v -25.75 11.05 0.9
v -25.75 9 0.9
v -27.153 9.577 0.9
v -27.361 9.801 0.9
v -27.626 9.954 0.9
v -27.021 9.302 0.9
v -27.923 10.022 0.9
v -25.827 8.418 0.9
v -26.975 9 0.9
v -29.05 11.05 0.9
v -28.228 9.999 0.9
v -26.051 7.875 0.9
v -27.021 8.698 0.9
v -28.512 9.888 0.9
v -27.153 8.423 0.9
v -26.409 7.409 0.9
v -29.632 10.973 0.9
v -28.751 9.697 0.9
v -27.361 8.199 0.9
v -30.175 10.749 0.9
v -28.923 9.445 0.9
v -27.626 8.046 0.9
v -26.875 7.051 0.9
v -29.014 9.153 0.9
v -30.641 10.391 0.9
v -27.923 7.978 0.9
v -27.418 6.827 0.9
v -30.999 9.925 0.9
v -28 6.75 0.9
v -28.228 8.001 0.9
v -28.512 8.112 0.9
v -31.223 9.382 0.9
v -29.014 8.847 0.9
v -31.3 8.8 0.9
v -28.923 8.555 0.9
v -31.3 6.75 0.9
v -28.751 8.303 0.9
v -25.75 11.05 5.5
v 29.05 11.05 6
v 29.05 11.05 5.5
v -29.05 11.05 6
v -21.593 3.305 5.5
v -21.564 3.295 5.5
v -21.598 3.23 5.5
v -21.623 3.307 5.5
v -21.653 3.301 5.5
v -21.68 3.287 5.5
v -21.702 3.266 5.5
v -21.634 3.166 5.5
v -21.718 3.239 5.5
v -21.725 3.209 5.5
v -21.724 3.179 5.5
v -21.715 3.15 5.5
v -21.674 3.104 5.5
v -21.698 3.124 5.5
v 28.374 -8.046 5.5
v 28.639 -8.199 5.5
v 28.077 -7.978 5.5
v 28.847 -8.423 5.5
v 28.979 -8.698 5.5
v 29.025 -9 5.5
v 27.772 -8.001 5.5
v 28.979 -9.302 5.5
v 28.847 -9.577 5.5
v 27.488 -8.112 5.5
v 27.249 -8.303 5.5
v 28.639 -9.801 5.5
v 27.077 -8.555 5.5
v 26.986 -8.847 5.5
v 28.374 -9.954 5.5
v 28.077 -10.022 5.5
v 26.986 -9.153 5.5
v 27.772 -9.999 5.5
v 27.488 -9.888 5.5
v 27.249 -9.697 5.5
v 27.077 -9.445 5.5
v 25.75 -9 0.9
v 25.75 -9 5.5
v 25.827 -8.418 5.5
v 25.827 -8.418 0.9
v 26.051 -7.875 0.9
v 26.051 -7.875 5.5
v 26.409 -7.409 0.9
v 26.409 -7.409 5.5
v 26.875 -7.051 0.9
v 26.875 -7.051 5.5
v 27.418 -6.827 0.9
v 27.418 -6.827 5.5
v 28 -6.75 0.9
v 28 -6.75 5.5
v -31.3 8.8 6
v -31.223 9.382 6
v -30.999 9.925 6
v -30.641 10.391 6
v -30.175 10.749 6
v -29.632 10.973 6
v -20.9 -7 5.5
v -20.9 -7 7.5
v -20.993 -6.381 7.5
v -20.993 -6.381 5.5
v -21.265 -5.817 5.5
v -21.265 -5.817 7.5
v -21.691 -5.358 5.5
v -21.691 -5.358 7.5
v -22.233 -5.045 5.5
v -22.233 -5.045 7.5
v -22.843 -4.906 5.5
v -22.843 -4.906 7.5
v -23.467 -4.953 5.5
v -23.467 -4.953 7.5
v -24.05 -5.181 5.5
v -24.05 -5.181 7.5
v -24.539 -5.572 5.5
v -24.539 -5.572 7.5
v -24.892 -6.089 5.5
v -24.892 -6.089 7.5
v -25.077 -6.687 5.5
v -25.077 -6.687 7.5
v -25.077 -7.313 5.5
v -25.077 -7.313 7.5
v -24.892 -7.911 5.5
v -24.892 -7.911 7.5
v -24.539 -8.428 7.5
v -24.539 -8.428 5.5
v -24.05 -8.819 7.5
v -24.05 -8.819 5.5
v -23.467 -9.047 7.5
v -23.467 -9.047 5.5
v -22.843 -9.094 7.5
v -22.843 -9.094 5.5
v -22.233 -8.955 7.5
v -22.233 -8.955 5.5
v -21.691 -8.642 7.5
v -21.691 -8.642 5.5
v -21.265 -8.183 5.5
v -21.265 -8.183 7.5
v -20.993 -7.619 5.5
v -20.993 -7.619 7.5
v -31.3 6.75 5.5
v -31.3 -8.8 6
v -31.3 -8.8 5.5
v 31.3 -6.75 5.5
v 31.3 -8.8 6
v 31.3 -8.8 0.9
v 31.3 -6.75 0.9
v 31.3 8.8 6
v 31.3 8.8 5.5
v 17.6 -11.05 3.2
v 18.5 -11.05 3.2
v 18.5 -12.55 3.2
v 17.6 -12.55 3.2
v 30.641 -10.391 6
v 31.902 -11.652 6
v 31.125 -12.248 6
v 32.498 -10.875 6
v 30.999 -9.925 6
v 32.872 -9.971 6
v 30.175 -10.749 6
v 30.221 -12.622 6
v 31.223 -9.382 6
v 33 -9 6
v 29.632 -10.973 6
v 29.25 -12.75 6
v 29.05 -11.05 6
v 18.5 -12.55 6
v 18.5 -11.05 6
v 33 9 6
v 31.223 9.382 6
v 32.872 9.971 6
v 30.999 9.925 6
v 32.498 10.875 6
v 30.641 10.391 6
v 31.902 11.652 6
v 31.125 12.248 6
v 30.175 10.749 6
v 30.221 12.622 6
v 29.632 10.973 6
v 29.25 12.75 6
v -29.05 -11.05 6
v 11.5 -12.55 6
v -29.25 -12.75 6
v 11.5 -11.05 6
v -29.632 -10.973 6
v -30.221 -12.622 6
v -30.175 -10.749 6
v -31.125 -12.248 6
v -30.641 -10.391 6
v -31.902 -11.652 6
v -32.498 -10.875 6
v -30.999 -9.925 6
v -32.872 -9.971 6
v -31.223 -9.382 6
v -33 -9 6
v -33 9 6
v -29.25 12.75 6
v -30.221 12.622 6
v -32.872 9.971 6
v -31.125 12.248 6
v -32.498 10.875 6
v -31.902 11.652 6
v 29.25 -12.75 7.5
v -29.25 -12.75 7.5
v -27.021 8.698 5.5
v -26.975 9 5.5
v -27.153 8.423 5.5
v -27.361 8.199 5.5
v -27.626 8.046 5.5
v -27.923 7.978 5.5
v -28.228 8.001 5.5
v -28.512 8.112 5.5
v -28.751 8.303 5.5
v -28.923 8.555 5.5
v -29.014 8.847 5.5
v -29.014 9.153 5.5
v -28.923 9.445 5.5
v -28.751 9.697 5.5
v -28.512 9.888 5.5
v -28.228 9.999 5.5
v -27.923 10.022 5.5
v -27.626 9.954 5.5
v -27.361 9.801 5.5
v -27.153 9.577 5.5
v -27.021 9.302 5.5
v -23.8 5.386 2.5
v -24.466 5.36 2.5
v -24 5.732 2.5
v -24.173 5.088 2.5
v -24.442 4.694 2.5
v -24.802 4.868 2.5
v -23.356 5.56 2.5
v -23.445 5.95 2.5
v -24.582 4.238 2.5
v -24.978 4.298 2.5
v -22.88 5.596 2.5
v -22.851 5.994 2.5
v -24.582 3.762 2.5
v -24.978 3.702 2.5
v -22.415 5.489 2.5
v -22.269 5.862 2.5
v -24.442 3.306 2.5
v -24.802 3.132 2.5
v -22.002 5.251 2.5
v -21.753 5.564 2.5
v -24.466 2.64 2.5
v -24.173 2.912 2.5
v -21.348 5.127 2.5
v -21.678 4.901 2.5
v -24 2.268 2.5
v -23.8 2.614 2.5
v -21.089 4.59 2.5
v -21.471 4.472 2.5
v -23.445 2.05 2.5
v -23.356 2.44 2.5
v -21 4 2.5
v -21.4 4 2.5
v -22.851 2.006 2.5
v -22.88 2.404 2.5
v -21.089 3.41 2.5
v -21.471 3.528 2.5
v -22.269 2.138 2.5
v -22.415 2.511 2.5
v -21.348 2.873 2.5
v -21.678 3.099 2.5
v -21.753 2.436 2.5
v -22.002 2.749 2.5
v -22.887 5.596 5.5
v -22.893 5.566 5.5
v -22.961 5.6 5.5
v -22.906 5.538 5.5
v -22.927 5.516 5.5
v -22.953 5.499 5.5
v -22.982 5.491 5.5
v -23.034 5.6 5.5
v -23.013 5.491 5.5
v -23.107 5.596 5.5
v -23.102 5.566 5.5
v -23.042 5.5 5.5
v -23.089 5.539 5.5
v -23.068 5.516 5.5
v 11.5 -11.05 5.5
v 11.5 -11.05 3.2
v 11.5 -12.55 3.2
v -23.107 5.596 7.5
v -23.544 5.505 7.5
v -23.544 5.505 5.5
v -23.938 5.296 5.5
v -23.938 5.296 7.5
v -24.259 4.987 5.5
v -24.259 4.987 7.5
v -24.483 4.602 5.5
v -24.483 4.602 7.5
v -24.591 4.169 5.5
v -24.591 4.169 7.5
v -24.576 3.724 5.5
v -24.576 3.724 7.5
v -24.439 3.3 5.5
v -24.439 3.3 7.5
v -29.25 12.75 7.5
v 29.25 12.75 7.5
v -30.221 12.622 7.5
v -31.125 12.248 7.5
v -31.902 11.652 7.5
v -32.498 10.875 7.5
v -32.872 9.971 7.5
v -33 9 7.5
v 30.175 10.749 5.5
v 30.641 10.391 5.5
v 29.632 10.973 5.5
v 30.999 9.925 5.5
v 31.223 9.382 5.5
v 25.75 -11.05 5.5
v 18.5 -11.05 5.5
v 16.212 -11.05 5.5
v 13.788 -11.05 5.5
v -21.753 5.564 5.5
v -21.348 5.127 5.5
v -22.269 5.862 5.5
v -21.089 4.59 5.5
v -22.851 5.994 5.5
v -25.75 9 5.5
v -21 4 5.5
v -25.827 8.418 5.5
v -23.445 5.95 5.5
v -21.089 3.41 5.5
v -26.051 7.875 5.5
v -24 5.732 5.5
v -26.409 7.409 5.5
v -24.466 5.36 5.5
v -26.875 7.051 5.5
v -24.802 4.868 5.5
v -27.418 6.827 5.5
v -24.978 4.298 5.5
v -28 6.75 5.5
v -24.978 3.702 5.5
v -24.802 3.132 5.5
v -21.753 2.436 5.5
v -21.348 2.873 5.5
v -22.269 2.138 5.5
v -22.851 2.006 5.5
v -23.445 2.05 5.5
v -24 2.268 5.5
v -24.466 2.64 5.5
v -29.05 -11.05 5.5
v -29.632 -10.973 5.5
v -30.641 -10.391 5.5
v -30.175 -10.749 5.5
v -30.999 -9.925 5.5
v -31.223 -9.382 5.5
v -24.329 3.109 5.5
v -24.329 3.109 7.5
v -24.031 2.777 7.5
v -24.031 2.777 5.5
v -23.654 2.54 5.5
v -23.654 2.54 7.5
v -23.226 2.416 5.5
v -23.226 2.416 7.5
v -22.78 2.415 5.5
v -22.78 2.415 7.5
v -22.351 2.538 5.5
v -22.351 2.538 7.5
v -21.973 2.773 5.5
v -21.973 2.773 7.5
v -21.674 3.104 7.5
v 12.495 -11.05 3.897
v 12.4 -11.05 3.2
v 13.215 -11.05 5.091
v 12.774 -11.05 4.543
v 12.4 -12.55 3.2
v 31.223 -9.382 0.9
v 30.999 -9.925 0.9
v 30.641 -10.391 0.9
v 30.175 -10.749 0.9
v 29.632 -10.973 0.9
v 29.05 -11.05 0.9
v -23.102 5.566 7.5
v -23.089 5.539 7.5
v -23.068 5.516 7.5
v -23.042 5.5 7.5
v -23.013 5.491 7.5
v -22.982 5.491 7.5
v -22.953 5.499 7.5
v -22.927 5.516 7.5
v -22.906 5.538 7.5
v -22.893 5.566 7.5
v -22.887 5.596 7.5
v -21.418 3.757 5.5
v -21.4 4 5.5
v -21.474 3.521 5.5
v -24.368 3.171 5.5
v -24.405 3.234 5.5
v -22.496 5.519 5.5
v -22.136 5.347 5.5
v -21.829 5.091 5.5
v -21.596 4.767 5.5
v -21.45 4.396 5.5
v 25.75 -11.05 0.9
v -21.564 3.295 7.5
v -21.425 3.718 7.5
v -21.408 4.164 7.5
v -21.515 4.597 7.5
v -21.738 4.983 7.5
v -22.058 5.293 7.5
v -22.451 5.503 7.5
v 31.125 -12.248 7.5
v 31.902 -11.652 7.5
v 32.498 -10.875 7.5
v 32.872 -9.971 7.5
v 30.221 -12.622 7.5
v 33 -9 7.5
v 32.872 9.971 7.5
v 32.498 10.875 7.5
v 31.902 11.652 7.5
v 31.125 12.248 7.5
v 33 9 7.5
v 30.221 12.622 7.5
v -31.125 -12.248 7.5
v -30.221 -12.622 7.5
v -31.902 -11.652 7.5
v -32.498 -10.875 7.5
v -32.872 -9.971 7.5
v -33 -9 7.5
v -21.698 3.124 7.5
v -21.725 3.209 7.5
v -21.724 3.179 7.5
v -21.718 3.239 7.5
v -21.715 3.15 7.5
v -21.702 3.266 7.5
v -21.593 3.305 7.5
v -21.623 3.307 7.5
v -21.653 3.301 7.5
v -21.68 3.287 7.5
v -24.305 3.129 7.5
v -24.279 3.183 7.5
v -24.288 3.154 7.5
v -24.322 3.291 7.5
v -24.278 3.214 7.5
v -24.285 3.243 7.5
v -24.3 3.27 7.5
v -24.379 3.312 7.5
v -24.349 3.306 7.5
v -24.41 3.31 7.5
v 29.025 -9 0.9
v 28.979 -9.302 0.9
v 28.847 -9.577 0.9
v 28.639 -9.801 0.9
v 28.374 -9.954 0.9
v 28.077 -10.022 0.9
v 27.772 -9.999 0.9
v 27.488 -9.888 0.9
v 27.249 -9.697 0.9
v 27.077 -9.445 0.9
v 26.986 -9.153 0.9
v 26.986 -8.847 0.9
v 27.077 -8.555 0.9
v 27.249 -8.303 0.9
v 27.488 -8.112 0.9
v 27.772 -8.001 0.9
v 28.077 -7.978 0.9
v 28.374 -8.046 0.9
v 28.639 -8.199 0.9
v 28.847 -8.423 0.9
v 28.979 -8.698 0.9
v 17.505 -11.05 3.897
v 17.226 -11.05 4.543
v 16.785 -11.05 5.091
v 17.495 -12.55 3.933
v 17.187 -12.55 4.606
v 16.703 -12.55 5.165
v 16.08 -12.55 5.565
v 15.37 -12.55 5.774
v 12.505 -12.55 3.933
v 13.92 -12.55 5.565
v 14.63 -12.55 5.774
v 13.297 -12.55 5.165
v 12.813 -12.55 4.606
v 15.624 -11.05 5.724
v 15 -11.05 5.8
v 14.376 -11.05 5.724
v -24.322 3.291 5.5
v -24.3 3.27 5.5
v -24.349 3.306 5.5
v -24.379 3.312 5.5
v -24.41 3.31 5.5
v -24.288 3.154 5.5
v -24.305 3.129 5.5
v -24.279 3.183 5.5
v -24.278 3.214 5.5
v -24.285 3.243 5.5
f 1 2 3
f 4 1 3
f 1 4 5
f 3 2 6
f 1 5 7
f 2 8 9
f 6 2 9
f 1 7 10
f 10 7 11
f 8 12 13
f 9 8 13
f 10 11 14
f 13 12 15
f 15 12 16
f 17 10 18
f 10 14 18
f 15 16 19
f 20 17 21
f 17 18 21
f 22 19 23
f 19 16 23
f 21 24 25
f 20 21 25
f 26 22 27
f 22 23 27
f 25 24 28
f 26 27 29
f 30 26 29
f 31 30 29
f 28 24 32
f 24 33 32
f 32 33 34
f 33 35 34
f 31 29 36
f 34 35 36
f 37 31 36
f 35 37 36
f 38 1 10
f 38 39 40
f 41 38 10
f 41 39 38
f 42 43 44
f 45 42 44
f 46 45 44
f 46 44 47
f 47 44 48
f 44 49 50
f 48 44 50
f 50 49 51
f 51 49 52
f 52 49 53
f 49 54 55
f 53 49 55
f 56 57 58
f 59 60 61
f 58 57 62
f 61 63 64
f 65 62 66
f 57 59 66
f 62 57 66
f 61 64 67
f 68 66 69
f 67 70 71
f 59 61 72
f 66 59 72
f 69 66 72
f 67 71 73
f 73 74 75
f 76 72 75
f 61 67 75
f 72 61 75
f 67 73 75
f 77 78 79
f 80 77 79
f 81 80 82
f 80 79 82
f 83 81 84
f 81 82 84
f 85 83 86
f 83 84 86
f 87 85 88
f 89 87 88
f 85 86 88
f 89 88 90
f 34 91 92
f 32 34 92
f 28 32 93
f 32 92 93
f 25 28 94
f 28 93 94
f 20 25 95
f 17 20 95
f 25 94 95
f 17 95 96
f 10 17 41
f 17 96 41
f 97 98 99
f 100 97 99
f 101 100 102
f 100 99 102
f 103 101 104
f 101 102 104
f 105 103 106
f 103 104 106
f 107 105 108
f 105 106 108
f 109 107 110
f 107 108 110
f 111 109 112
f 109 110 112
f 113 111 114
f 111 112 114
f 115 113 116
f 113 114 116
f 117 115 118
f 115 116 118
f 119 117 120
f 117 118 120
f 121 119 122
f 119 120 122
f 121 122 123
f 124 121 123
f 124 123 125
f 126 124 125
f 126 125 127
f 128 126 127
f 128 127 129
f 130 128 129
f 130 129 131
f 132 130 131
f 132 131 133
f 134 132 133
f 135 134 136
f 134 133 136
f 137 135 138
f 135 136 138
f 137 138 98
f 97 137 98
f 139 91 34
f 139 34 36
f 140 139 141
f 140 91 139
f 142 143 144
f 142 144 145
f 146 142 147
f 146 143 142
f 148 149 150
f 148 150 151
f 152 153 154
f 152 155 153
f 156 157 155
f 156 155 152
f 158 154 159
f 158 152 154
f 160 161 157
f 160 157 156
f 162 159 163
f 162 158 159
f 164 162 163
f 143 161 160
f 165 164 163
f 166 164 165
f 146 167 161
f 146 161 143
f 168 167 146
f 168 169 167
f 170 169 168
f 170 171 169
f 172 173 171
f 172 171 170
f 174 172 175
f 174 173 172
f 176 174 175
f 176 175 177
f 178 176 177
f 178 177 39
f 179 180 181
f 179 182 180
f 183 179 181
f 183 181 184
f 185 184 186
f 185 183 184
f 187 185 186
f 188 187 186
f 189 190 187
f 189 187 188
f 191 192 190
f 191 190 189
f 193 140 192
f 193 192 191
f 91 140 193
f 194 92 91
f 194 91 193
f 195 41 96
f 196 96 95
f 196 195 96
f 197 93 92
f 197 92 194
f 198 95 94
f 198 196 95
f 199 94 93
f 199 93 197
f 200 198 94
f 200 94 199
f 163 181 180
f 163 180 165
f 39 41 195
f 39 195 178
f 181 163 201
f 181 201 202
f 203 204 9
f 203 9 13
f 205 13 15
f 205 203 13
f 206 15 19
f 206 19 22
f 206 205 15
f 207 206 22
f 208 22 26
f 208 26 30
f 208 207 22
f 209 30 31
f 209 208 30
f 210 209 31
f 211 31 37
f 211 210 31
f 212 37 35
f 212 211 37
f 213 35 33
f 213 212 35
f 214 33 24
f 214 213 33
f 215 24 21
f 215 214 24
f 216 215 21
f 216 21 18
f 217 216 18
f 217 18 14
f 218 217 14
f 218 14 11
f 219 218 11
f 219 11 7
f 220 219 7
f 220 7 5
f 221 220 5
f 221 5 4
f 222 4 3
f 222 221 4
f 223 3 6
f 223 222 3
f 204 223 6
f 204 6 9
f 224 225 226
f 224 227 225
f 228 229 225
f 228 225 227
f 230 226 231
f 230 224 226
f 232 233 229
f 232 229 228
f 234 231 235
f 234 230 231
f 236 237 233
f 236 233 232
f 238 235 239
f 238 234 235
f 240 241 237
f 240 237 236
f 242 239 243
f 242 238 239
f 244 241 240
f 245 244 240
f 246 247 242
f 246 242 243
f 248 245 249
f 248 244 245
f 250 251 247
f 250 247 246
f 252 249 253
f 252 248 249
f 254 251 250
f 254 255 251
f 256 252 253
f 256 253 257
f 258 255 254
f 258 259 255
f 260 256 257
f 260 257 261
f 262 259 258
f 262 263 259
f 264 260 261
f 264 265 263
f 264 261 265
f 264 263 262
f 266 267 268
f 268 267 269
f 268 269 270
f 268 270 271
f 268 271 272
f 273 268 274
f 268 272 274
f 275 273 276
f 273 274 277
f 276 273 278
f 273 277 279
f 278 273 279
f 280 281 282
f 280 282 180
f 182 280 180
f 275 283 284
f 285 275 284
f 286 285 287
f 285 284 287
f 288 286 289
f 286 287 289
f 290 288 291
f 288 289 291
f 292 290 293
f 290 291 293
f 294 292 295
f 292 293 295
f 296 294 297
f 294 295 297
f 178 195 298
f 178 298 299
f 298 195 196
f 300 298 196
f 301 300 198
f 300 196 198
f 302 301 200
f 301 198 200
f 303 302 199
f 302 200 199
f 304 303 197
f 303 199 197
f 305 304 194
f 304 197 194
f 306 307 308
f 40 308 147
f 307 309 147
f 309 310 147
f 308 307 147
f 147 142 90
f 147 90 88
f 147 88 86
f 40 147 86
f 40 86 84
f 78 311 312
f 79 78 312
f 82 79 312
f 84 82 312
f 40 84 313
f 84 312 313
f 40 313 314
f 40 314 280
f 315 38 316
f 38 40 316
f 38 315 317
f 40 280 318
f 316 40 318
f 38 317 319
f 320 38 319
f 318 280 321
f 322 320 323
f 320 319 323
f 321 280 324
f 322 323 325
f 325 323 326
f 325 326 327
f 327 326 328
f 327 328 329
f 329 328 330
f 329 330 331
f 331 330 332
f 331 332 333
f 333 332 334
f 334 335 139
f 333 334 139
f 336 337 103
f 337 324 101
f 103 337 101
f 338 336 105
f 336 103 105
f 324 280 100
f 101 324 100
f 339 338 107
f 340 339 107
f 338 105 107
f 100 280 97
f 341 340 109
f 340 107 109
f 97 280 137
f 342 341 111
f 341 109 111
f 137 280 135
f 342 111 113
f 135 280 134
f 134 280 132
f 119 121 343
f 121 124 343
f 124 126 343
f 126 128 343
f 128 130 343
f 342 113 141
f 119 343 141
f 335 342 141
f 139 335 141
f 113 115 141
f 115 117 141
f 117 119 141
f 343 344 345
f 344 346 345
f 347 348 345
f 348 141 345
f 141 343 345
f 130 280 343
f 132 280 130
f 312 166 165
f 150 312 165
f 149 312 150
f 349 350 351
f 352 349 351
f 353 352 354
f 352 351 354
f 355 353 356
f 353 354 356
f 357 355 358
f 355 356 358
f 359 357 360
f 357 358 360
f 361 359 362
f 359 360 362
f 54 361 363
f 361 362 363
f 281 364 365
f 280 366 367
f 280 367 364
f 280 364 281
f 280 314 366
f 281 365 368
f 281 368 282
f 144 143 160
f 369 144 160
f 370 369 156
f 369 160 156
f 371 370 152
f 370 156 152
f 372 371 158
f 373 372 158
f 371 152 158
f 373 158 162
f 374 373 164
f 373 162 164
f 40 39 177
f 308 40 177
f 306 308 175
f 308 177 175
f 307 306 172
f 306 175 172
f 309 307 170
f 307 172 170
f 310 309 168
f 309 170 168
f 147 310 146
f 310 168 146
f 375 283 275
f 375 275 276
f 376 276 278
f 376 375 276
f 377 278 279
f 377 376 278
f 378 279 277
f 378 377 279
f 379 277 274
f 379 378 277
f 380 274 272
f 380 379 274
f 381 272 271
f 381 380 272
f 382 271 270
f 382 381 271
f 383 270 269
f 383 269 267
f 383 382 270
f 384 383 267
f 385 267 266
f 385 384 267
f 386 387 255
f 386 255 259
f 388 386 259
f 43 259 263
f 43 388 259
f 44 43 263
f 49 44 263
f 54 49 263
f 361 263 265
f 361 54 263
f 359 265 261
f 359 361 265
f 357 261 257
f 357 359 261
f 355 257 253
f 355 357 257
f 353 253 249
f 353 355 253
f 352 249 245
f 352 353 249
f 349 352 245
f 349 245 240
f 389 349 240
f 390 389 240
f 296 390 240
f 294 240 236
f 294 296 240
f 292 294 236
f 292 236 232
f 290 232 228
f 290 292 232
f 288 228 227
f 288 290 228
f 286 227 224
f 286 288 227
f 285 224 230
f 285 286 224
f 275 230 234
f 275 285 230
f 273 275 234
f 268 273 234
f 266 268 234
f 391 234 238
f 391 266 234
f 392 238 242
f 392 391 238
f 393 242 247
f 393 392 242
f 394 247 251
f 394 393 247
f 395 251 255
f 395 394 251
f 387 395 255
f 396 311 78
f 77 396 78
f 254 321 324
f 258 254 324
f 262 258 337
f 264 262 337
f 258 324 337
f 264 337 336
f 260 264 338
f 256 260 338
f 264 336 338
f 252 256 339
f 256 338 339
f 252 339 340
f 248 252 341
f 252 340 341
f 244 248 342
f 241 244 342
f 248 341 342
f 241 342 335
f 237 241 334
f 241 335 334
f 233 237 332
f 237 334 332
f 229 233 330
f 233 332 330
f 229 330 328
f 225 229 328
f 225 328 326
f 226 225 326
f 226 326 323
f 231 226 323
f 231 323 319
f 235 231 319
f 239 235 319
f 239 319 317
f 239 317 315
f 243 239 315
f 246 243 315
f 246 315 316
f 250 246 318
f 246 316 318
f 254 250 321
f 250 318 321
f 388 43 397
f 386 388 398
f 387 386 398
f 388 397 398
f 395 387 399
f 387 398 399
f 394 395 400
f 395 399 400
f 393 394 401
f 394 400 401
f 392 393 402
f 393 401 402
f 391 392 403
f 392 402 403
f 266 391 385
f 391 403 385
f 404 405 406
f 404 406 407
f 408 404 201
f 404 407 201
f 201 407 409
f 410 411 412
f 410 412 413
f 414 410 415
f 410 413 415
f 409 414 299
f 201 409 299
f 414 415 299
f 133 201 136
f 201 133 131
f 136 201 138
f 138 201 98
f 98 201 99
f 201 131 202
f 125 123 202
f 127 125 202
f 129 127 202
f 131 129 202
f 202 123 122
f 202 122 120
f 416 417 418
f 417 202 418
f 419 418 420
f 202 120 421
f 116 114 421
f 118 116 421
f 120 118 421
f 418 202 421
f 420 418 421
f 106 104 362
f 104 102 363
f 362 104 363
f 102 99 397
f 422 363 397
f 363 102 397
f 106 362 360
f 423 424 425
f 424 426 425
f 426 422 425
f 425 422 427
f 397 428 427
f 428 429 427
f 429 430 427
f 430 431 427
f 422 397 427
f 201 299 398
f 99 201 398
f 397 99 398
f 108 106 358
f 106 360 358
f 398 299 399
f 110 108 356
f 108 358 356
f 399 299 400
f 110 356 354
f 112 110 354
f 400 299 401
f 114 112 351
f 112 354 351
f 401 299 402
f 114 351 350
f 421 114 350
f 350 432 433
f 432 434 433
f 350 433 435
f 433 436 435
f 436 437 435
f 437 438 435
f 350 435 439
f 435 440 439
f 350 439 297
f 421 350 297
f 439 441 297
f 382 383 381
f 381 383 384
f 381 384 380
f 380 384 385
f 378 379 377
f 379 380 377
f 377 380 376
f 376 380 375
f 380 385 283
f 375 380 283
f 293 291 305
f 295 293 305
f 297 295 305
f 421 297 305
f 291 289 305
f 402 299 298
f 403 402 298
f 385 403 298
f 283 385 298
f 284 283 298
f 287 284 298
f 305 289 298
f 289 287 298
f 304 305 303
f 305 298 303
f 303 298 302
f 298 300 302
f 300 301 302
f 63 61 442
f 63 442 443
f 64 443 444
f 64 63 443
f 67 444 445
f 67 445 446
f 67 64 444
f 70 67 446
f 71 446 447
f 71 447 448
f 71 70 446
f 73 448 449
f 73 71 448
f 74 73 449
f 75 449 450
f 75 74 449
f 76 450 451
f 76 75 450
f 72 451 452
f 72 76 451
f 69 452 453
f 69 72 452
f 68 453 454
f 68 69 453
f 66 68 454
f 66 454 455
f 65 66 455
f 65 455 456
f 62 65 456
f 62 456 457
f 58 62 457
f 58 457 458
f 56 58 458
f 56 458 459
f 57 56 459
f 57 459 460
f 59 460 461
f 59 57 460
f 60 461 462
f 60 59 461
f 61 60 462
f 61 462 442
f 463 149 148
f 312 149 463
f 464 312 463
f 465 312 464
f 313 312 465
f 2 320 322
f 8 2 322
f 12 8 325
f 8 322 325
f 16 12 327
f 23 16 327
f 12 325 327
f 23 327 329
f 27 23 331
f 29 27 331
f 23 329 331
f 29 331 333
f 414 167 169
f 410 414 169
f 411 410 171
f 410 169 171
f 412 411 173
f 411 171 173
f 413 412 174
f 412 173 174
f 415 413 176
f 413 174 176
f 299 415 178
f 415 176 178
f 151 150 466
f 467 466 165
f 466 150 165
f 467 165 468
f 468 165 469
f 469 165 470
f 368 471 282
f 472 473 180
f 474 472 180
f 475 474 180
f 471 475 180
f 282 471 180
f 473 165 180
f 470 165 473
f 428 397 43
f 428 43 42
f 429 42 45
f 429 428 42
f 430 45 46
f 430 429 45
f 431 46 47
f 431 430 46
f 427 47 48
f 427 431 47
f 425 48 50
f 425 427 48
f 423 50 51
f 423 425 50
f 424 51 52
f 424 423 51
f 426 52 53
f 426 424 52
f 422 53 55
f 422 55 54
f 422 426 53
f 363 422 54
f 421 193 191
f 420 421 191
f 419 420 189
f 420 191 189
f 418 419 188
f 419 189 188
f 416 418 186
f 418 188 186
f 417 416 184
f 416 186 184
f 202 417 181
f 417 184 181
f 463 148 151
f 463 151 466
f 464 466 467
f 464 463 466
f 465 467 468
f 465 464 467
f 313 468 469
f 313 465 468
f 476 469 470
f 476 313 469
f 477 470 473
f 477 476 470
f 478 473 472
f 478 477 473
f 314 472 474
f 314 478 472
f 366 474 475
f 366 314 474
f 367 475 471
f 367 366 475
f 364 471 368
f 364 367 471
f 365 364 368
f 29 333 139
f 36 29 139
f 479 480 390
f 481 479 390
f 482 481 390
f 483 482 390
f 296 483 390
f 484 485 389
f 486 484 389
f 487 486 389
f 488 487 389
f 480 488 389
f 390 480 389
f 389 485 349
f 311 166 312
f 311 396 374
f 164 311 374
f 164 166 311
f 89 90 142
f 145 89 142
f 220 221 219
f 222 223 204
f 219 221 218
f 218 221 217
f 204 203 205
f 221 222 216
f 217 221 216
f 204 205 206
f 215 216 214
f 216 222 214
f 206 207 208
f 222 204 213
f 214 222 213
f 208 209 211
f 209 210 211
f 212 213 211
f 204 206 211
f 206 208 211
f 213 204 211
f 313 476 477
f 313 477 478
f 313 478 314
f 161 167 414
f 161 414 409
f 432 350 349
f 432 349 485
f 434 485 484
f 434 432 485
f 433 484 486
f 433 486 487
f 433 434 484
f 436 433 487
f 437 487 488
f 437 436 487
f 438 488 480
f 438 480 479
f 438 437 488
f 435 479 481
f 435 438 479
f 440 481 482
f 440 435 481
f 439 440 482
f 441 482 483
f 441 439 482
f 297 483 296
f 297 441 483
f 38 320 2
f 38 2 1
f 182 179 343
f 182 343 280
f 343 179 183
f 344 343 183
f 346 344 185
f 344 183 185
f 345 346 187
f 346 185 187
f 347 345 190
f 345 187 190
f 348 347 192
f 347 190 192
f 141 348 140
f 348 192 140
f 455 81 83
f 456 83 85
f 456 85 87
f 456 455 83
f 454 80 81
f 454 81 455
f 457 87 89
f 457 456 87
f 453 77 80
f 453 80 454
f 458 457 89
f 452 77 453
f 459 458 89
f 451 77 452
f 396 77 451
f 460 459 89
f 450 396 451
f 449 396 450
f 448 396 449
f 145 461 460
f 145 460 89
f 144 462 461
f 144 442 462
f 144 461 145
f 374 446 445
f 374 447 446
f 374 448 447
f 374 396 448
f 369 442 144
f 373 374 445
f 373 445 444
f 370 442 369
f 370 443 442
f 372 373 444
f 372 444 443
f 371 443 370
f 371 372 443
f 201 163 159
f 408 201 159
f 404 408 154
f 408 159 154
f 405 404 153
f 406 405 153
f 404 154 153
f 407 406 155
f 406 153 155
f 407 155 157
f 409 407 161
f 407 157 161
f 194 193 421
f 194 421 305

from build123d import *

# Parameters (mm, degrees)
PAD002_DEPTH  = 1.5
PAD003_DEPTH  = 0.5
SKETCH005_R   = 1.025
PAD004_DEPTH  = 4.6
SKETCH006_R   = 2.1
POCKET_DEPTH  = 2
SKETCH008_R   = 2
SKETCH008_R_2 = 1.6
PAD005_DEPTH  = 3
PAD014_DEPTH  = 1.5


with BuildPart() as part:
    # Sketch003 → Pad002 (new body)
    with BuildSketch(Plane.XY.offset(6)):
        with BuildLine():
            Line((-29.25, 12.75), (29.25, 12.75))
            ThreePointArc((33, 9), (31.9016504294, 11.6516504294), (29.25, 12.75))
            Line((33, 9), (33, -9))
            ThreePointArc((29.25, -12.75), (31.9016504295, -11.6516504294), (33, -9))
            Line((29.25, -12.75), (-29.25, -12.75))
            ThreePointArc((-33, -9), (-31.9016504294, -11.6516504295), (-29.25, -12.75))
            Line((-33, -9), (-33, 9))
            ThreePointArc((-29.25, 12.75), (-31.9016504294, 11.6516504294), (-33, 9))
        make_face()
    extrude(amount=PAD002_DEPTH)

    # Sketch004 → Pad003 (new body)
    with BuildSketch(Plane(origin=(0, 0, 6), x_dir=(1, 0, 0), z_dir=(0, 0, -1))):
        with BuildLine():
            Line((-29.05, 11.05), (29.05, 11.05))
            ThreePointArc((31.3, 8.8), (30.6409902577, 10.3909902577), (29.05, 11.05))
            Line((31.3, 8.8), (31.3, -8.8))
            ThreePointArc((29.05, -11.05), (30.6409902577, -10.3909902577), (31.3, -8.8))
            Line((29.05, -11.05), (-29.05, -11.05))
            ThreePointArc((-31.3, -8.8), (-30.6409902577, -10.3909902577), (-29.05, -11.05))
            Line((-31.3, -8.8), (-31.3, 8.8))
            ThreePointArc((-29.05, 11.05), (-30.6409902577, 10.3909902577), (-31.3, 8.8))
        make_face()
    extrude(amount=PAD003_DEPTH)

    # Sketch005 → Pad004 (new body)
    with BuildSketch(Plane(origin=(0, 0, 5.5), x_dir=(1, 0, 0), z_dir=(0, 0, -1))):
        with BuildLine():
            Line((-25.75, -9), (-25.75, -11.05))
            Line((-25.75, -11.05), (-29.05, -11.05))
            ThreePointArc((-31.3, -8.8), (-30.6409902577, -10.3909902577), (-29.05, -11.05))
            Line((-31.3, -6.75), (-31.3, -8.8))
            Line((-27.9999999649, -6.75), (-31.3, -6.75))
            ThreePointArc((-25.75, -9.0000000351), (-26.4090097175, -7.4090097671), (-27.9999999649, -6.75))
        make_face()
        with Locations((-28, -9)):
            Circle(SKETCH005_R, mode=Mode.SUBTRACT)
        with BuildLine():
            ThreePointArc((25.75, 9), (26.4090097423, 7.4090097423), (28, 6.75))
            Line((28, 6.75), (31.3, 6.75))
            Line((31.3, 8.8), (31.3, 6.75))
            ThreePointArc((31.3, 8.8), (30.6409902577, 10.3909902577), (29.05, 11.05))
            Line((29.05, 11.05), (25.75, 11.05))
            Line((25.75, 11.05), (25.75, 9))
        make_face()
        with Locations((28, 9)):
            Circle(SKETCH005_R, mode=Mode.SUBTRACT)
    extrude(amount=PAD004_DEPTH)

    # Sketch006 → Pocket (cut)
    with BuildSketch(Plane.XY.offset(7.5)):
        with Locations((-23, -7)):
            Circle(SKETCH006_R)
        with BuildLine():
            ThreePointArc((-24.3288922086, 3.1089076939), (-23.0026761128, 2.400002238), (-21.6740960519, 3.1044673539))
            ThreePointArc((-21.5638430432, 3.2946963807), (-21.7108688116, 3.2528448762), (-21.6740960519, 3.1044673539))
            ThreePointArc((-21.5638430432, 3.2946963807), (-21.6130238799, 4.7976824194), (-22.8873953748, 5.5960326433))
            ThreePointArc((-23.1072650483, 5.5964003913), (-22.9975078699, 5.4899979159), (-22.8873953748, 5.5960326433))
            ThreePointArc((-23.1072650483, 5.5964003913), (-24.3843000035, 4.8023175806), (-24.4385082583, 3.2995044678))
            ThreePointArc((-24.3288922086, 3.1089076939), (-24.2916233116, 3.2571613762), (-24.4385082583, 3.2995044678))
        make_face()
    extrude(amount=-POCKET_DEPTH, mode=Mode.SUBTRACT)

    # Sketch008 → Pad005 (new body)
    with BuildSketch(Plane(origin=(0, 0, 5.5), x_dir=(1, 0, 0), z_dir=(0, 0, -1))):
        with Locations((-23, -4)):
            Circle(SKETCH008_R)
        with Locations((-23, -4)):
            Circle(SKETCH008_R_2, mode=Mode.SUBTRACT)
    extrude(amount=PAD005_DEPTH)

    # Sketch023 → Pad014 (new body)
    with BuildSketch(Plane(origin=(0, -11.05, 6), x_dir=(1, 0, 0), z_dir=(0, -1, 0))):
        with BuildLine():
            Line((11.5, 0), (18.5, 0))
            Line((18.5, 0), (18.5, -2.8))
            Line((18.5, -2.8), (17.6, -2.8))
            ThreePointArc((17.6, -2.8000000001), (15, -0.2000000001), (12.4, -2.8))
            Line((12.4, -2.8), (11.5, -2.8))
            Line((11.5, -2.8), (11.5, 0))
        make_face()
    extrude(amount=PAD014_DEPTH)


solid = part.part
